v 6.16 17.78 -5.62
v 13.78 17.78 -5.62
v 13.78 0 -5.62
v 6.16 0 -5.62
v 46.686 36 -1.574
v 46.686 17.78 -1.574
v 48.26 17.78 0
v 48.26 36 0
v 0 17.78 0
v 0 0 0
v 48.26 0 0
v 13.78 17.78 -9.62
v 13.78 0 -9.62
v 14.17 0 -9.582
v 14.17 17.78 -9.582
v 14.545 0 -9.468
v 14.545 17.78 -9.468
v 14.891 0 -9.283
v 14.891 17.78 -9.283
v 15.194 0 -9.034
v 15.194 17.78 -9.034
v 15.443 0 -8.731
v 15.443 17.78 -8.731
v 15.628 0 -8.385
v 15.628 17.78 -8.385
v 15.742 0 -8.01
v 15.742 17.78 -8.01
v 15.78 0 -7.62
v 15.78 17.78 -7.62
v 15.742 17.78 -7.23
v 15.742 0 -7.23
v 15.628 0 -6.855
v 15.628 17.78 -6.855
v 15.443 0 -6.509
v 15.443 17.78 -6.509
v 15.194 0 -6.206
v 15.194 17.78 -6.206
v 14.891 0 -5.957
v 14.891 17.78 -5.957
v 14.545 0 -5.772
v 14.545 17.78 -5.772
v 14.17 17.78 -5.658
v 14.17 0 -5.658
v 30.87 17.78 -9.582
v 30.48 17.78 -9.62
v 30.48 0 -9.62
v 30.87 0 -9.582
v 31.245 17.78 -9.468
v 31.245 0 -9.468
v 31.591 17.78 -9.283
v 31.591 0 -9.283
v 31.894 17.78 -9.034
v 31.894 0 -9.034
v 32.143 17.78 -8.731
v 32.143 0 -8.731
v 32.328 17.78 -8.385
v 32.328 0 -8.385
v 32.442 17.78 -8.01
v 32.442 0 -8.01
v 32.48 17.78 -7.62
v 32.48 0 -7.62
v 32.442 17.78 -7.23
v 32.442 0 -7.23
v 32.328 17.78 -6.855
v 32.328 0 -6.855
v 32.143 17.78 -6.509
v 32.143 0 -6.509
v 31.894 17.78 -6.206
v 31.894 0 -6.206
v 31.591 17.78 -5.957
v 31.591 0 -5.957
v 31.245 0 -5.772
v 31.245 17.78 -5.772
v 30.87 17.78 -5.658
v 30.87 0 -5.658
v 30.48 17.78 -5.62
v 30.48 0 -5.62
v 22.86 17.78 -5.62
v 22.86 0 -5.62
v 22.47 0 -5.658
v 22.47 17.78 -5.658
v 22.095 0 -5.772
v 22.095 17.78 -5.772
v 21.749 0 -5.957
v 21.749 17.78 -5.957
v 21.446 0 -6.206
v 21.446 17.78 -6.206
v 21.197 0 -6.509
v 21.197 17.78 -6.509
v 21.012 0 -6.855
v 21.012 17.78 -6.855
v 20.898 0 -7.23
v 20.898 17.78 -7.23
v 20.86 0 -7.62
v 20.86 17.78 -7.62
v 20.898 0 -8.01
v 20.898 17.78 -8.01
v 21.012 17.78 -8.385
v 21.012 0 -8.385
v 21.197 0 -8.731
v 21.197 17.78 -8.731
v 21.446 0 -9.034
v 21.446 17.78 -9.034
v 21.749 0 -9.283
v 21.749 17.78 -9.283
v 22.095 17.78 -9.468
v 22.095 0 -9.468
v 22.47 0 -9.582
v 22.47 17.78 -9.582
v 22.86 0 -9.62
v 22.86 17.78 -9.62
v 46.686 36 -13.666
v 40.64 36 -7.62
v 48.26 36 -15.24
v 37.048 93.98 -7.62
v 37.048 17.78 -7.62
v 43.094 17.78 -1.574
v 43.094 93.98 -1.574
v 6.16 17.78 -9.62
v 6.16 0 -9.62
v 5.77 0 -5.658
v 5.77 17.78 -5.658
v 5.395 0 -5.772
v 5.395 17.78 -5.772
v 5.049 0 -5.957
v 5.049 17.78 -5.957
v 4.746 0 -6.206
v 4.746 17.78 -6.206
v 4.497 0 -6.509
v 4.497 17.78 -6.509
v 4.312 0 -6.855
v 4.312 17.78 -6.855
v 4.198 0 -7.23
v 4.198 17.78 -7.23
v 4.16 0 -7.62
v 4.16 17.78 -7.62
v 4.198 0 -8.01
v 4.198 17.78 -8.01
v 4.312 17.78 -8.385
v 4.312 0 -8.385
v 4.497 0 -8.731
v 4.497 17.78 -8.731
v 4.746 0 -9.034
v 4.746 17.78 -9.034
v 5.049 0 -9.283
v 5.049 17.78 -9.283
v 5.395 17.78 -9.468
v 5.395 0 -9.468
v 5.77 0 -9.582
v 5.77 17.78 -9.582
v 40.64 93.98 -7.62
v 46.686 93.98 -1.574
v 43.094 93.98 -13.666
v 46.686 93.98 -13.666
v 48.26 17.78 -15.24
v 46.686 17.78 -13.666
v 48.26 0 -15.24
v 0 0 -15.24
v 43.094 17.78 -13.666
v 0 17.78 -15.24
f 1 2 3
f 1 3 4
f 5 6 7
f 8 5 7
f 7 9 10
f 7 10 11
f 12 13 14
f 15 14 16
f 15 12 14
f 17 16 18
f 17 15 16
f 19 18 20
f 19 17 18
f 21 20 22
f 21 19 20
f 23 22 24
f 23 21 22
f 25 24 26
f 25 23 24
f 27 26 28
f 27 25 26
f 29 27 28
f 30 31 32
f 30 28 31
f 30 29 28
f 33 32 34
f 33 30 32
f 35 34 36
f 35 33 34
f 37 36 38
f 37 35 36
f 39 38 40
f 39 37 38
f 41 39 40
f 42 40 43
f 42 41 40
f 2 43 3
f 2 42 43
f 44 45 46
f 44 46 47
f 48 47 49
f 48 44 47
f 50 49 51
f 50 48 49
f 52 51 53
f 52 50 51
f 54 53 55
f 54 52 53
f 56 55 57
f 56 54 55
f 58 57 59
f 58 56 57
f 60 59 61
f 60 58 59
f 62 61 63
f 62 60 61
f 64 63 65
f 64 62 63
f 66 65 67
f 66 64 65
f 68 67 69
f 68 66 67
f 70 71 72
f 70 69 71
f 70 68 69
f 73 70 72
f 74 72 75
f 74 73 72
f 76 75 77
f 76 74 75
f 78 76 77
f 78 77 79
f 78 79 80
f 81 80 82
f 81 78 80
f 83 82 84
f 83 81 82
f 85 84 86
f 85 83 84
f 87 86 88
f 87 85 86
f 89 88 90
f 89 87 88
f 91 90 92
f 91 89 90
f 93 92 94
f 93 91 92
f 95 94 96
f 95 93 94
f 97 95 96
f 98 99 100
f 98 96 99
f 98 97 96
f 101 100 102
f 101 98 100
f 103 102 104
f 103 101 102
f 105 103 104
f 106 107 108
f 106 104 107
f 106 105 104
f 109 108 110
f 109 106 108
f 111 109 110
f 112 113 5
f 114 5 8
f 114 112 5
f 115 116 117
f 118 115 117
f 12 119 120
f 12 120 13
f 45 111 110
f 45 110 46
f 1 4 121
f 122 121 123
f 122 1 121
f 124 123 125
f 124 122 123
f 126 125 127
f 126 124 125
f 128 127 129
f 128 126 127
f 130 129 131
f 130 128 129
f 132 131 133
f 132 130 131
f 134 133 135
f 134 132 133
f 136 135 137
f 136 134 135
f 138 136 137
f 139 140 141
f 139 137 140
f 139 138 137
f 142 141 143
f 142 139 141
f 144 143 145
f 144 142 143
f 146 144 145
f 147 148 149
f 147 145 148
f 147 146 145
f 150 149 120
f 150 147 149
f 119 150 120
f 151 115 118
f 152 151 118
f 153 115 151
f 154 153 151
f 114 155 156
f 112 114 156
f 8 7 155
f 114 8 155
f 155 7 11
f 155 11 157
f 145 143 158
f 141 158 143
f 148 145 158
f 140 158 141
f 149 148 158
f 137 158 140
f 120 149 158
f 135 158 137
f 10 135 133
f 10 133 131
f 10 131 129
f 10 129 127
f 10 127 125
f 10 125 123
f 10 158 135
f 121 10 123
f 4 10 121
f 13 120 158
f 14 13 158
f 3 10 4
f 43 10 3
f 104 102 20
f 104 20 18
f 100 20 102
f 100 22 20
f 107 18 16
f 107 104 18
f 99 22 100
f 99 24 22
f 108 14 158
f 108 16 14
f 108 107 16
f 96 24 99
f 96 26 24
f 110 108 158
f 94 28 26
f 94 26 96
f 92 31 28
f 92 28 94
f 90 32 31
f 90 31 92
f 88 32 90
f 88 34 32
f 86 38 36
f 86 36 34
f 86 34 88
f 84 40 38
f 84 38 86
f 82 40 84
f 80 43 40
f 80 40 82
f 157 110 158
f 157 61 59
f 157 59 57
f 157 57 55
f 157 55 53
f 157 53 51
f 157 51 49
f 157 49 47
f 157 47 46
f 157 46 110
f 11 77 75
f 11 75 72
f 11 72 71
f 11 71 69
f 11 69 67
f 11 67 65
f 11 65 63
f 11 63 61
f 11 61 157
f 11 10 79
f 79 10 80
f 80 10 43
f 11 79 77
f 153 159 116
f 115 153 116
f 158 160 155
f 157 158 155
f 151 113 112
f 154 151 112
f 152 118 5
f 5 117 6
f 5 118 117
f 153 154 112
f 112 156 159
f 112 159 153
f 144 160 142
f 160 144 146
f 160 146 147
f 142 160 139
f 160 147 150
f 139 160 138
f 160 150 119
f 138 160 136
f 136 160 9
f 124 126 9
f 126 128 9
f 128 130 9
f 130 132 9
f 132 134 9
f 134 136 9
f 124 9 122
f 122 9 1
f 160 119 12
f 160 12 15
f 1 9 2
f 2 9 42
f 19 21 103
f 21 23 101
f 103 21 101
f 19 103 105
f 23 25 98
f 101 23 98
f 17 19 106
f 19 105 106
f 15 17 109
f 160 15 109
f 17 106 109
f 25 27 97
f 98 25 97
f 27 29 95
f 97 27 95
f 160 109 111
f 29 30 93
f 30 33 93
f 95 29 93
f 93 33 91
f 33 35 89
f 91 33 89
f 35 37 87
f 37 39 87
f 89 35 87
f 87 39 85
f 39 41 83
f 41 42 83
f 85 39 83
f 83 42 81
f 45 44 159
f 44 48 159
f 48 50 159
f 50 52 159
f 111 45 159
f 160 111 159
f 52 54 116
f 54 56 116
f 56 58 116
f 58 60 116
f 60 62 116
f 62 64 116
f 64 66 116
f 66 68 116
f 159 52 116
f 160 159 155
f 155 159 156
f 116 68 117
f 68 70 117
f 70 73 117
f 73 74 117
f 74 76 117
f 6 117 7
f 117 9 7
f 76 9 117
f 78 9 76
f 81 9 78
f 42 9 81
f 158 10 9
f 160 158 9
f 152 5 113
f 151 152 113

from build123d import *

# Parameters (mm, degrees)
SKETCH1_W           = 48.26
SKETCH1_H           = 17.78
BOSS_EXTRUDE1_DEPTH = 15.24
CUT_EXTRUDE2_DEPTH  = 54.641528688
BOSS_EXTRUDE2_DEPTH = 76.2
BOSS_EXTRUDE4_DEPTH = 18.21999912


with BuildPart() as part:
    # Sketch1 → Boss-Extrude1 (new body)
    with BuildSketch(Plane.XY):
        with Locations((24.13, 8.89)):
            Rectangle(SKETCH1_W, SKETCH1_H)
    extrude(amount=-BOSS_EXTRUDE1_DEPTH)

    # Sketch4 → Cut-Extrude2 (cut, through all)
    with BuildSketch(Plane(origin=(0, 17.78, 0), x_dir=(1, 0, 0), z_dir=(0, 1, 0))):
        with BuildLine():
            Line((30.48, 5.62), (22.86, 5.62))
            ThreePointArc((22.86, 5.62), (20.86, 7.62), (22.86, 9.62))
            Line((22.86, 9.62), (30.48, 9.62))
            ThreePointArc((30.48, 9.62), (32.48, 7.62), (30.48, 5.62))
        make_face()
        with BuildLine():
            Line((13.78, 5.62), (6.16, 5.62))
            ThreePointArc((6.16, 5.62), (4.16, 7.62), (6.16, 9.62))
            Line((6.16, 9.62), (13.78, 9.62))
            ThreePointArc((13.78, 9.62), (15.78, 7.62), (13.78, 5.62))
        make_face()
    extrude(amount=-CUT_EXTRUDE2_DEPTH, mode=Mode.SUBTRACT)

    # Sketch3 → Boss-Extrude2 (add)
    with BuildSketch(Plane(origin=(0, 17.78, 0), x_dir=(1, 0, 0), z_dir=(0, 1, 0))):
        Polygon((40.64, 7.62), (46.685762979, 13.665762979), (43.093660531, 13.665762979), (37.047897552, 7.62), (43.093660531, 1.574237021), (46.685762979, 1.574237021), align=None)
    extrude(amount=BOSS_EXTRUDE2_DEPTH)

    # Sketch3<7> → Boss-Extrude4 (add)
    with BuildSketch(Plane(origin=(0, 17.78, 0), x_dir=(1, 0, 0), z_dir=(0, 1, 0))):
        Polygon((48.26, 0), (48.26, 15.24), (46.685762979, 13.665762979), (40.64, 7.62), (46.685762979, 1.574237021), align=None)
    extrude(amount=BOSS_EXTRUDE4_DEPTH)


solid = part.part
